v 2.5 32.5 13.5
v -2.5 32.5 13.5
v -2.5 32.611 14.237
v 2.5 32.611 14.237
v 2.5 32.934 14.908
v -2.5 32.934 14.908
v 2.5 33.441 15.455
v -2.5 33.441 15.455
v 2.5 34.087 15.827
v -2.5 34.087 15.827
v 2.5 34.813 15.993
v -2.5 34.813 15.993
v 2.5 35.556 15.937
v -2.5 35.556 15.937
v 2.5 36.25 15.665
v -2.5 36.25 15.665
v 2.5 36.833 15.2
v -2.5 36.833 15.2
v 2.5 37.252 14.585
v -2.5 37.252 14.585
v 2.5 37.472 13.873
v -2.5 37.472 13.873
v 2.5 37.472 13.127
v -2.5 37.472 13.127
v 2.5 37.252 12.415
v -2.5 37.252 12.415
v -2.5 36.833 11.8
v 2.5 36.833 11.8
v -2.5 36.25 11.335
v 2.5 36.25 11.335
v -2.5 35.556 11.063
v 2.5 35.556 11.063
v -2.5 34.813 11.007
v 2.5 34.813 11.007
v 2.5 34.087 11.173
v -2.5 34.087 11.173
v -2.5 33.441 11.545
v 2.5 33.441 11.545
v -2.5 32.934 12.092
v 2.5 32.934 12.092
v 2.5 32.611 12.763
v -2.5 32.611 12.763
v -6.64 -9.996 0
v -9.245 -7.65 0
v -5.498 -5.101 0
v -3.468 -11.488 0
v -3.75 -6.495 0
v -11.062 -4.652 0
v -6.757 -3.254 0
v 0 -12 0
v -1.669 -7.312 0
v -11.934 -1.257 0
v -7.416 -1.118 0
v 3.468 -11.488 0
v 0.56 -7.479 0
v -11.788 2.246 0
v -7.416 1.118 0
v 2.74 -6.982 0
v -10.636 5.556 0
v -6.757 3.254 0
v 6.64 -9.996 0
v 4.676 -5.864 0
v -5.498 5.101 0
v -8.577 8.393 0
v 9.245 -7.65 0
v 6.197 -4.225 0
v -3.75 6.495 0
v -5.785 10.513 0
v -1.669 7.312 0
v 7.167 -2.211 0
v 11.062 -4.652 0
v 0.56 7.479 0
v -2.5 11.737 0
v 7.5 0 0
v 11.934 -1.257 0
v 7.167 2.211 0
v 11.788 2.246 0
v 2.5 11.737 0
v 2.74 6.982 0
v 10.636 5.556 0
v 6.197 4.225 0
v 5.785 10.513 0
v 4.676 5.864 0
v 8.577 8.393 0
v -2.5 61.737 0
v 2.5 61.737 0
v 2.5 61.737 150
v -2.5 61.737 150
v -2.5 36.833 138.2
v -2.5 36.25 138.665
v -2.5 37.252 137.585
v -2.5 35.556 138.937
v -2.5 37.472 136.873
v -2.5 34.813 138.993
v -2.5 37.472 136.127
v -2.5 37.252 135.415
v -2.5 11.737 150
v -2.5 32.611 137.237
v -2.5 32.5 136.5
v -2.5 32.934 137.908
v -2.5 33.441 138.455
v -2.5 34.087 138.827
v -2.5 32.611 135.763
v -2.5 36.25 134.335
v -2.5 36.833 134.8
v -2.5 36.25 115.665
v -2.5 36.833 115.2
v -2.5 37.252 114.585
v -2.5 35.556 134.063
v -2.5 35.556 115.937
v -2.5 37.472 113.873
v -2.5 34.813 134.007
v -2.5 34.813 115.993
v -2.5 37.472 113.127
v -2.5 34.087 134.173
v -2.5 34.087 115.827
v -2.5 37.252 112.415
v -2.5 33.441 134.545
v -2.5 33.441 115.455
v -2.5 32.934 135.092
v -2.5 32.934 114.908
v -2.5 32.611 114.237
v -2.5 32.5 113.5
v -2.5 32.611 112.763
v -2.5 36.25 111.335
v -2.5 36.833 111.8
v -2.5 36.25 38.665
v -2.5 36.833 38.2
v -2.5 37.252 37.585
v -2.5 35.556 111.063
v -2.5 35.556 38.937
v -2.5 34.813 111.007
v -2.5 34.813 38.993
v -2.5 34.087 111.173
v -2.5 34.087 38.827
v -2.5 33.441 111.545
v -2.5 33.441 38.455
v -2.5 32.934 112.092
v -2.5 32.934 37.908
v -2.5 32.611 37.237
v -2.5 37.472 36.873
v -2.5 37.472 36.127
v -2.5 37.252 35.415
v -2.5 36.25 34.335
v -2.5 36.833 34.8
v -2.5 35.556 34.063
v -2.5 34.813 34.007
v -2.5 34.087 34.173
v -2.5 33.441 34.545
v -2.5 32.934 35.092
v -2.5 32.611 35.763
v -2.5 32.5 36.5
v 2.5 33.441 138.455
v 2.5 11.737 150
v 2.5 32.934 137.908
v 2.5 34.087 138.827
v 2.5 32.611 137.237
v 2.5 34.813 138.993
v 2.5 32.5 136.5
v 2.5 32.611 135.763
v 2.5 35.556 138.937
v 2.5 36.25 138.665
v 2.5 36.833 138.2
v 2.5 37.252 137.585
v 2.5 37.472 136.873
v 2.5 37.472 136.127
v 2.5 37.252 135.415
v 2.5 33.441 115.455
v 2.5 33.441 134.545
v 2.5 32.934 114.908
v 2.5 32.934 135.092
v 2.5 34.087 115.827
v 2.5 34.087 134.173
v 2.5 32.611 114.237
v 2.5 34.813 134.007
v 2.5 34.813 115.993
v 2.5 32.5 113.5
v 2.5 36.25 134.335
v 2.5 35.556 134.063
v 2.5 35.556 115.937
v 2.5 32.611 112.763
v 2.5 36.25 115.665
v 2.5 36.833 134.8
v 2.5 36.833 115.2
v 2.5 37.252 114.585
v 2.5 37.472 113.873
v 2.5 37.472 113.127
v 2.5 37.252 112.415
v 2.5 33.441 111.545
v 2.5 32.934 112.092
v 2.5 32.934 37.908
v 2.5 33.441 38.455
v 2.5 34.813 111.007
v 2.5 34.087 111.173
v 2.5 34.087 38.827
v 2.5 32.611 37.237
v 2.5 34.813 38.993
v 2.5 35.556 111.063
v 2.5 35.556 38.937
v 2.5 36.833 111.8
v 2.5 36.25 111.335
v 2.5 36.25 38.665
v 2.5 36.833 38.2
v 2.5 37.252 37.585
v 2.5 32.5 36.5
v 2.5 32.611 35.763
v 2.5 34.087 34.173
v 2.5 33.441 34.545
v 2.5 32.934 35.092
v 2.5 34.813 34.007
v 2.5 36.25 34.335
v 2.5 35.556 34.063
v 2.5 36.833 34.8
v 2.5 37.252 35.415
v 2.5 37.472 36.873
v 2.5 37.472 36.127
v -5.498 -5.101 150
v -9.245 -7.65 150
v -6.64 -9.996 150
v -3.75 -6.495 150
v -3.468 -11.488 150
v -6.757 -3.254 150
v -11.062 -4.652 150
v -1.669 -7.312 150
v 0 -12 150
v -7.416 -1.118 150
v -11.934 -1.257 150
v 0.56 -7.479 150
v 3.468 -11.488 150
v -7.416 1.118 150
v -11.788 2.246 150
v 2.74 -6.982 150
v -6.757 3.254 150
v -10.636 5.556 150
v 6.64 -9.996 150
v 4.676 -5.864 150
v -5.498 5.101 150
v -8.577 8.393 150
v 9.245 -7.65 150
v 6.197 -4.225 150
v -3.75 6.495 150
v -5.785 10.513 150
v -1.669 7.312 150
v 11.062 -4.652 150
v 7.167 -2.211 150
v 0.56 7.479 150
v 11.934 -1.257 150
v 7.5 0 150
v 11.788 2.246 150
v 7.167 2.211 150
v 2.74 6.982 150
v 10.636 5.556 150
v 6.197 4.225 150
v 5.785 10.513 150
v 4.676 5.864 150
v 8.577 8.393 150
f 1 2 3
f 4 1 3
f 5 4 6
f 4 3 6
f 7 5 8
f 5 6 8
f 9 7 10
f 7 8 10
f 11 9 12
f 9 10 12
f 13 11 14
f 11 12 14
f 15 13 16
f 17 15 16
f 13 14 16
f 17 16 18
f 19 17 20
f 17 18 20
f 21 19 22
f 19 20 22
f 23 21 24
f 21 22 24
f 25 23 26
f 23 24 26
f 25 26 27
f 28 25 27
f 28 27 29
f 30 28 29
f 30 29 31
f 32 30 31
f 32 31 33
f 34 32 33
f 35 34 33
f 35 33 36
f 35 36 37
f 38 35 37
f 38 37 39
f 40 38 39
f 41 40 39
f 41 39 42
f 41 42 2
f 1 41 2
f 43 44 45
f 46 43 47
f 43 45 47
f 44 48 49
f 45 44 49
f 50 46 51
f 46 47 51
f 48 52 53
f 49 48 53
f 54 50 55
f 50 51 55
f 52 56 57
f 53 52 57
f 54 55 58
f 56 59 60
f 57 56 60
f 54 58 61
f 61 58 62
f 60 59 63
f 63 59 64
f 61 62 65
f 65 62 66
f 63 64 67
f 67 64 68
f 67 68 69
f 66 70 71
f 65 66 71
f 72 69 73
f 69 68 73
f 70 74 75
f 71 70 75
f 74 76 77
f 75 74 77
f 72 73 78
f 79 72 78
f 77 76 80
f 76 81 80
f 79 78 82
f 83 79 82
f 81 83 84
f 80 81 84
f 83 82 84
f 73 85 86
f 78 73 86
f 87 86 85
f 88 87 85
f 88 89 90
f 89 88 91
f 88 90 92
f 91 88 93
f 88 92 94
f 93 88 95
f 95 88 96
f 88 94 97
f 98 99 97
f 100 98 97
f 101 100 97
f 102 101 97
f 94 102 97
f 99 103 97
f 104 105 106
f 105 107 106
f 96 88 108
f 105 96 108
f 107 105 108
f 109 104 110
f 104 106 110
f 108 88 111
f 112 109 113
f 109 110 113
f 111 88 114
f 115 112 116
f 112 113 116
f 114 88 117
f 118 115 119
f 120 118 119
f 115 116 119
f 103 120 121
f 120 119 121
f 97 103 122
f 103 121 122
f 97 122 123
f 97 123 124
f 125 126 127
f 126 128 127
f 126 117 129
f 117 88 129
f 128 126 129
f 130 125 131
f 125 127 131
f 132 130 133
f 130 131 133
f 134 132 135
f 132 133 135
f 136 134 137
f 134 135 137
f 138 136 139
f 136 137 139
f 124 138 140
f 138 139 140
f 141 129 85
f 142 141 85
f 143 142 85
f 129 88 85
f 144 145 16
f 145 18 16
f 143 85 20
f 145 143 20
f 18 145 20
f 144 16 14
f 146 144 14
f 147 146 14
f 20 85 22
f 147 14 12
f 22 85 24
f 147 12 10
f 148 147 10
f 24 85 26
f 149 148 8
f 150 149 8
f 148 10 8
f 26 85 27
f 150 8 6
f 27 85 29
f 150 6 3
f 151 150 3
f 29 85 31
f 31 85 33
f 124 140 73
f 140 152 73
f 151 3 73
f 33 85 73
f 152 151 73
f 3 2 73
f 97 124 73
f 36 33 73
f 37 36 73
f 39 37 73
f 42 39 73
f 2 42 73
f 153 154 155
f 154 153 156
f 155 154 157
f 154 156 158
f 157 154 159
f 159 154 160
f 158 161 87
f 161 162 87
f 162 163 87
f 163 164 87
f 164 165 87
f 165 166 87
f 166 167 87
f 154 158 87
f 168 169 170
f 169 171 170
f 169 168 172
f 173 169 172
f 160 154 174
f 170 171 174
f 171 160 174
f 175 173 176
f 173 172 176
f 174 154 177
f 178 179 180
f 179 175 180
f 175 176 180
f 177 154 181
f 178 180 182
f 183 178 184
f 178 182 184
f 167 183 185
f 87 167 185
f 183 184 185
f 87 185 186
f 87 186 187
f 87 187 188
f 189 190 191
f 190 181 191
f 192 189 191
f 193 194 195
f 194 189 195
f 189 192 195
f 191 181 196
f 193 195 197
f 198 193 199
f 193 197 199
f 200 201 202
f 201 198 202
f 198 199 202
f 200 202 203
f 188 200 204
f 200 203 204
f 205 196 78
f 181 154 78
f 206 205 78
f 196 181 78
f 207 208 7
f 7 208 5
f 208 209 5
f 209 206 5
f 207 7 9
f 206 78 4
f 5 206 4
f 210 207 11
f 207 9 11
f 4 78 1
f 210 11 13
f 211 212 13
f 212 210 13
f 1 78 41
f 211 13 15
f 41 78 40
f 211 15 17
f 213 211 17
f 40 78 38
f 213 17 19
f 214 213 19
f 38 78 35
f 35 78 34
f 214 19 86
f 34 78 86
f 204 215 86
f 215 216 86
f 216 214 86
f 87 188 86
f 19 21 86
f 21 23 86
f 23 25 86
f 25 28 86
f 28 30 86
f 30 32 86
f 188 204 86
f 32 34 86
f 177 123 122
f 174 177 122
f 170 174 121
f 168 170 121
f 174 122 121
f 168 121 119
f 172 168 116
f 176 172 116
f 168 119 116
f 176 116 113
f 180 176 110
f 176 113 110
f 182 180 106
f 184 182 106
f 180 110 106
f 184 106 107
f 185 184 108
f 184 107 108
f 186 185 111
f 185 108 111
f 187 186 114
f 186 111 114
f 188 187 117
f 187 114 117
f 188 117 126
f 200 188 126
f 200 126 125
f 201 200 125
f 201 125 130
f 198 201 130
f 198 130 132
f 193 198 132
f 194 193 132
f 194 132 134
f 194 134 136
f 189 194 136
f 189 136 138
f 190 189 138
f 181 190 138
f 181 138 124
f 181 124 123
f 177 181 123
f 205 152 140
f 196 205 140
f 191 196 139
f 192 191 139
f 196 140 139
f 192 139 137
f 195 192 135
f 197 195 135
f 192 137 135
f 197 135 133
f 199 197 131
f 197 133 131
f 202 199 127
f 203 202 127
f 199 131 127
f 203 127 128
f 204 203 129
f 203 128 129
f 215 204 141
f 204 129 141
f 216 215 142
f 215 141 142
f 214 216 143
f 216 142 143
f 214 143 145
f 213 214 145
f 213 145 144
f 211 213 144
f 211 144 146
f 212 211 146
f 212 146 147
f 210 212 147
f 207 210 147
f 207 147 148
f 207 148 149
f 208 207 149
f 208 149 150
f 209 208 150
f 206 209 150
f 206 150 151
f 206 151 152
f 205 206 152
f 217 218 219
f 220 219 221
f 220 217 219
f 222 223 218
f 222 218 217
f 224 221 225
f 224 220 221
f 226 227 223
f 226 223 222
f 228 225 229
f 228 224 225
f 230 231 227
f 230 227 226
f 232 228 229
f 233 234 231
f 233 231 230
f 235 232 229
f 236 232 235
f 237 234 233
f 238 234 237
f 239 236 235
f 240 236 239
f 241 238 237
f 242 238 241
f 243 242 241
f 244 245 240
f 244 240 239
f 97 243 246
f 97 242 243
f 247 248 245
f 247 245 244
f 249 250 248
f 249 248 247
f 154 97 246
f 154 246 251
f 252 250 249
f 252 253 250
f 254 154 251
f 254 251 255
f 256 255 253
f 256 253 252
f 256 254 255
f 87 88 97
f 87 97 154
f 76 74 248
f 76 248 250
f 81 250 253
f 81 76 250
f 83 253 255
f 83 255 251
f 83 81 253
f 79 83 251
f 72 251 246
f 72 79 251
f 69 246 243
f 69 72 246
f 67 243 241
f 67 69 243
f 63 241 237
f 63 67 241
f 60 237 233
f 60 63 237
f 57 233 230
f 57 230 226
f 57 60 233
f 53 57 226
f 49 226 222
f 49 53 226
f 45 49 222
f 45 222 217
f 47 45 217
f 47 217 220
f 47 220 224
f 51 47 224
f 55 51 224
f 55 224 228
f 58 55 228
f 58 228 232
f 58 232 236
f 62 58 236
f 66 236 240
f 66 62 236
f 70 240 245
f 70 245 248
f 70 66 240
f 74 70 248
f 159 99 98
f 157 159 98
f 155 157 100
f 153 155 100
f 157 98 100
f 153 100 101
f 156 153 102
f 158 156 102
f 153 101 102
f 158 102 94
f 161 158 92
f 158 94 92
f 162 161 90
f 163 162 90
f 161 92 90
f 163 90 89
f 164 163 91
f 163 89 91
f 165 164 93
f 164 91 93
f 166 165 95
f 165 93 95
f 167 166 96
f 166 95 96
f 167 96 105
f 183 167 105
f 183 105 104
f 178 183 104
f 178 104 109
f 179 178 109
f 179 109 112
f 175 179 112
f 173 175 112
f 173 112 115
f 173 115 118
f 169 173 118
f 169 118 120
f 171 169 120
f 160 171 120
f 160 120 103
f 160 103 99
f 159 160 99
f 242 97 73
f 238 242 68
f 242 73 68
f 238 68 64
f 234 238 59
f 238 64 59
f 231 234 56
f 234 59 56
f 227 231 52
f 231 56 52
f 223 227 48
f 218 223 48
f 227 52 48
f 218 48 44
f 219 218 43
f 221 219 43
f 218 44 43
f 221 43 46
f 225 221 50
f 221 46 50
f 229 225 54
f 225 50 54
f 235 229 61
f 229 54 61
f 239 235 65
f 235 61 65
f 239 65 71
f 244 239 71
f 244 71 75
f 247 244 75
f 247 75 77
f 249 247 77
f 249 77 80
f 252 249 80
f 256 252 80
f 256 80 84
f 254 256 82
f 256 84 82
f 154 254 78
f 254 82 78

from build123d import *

# Parameters (mm, degrees)
SKETCH1_R           = 7.5
BOSS_EXTRUDE1_DEPTH = 150
SKETCH3_R           = 2.5
CUT_EXTRUDE2_DEPTH  = 163.854749576


with BuildPart() as part:
    # Sketch1 → Boss-Extrude1 (new body)
    with BuildSketch(Plane.XY):
        with BuildLine():
            Line((-2.5, 61.736694594), (-2.5, 11.736694594))
            ThreePointArc((-2.5, 11.736694594), (0, -12), (2.5, 11.736694594))
            Line((2.5, 11.736694594), (2.5, 61.736694594))
            Line((2.5, 61.736694594), (-2.5, 61.736694594))
        make_face()
        Circle(SKETCH1_R, mode=Mode.SUBTRACT)
    extrude(amount=BOSS_EXTRUDE1_DEPTH)

    # Sketch3 → Cut-Extrude2 (cut, through all)
    with BuildSketch(Plane.ZY.offset(2.5)):
        with Locations(Location((113.5, 35, 0), (0, 0, 270))):
            Circle(SKETCH3_R)
        with Locations(Location((136.5, 35, 0), (0, 0, 270))):
            Circle(SKETCH3_R)
        with Locations(Location((36.5, 35, 0), (0, 0, 270))):
            Circle(SKETCH3_R)
        with Locations(Location((13.5, 35, 0), (0, 0, 270))):
            Circle(SKETCH3_R)
    extrude(amount=-CUT_EXTRUDE2_DEPTH, mode=Mode.SUBTRACT)


solid = part.part
